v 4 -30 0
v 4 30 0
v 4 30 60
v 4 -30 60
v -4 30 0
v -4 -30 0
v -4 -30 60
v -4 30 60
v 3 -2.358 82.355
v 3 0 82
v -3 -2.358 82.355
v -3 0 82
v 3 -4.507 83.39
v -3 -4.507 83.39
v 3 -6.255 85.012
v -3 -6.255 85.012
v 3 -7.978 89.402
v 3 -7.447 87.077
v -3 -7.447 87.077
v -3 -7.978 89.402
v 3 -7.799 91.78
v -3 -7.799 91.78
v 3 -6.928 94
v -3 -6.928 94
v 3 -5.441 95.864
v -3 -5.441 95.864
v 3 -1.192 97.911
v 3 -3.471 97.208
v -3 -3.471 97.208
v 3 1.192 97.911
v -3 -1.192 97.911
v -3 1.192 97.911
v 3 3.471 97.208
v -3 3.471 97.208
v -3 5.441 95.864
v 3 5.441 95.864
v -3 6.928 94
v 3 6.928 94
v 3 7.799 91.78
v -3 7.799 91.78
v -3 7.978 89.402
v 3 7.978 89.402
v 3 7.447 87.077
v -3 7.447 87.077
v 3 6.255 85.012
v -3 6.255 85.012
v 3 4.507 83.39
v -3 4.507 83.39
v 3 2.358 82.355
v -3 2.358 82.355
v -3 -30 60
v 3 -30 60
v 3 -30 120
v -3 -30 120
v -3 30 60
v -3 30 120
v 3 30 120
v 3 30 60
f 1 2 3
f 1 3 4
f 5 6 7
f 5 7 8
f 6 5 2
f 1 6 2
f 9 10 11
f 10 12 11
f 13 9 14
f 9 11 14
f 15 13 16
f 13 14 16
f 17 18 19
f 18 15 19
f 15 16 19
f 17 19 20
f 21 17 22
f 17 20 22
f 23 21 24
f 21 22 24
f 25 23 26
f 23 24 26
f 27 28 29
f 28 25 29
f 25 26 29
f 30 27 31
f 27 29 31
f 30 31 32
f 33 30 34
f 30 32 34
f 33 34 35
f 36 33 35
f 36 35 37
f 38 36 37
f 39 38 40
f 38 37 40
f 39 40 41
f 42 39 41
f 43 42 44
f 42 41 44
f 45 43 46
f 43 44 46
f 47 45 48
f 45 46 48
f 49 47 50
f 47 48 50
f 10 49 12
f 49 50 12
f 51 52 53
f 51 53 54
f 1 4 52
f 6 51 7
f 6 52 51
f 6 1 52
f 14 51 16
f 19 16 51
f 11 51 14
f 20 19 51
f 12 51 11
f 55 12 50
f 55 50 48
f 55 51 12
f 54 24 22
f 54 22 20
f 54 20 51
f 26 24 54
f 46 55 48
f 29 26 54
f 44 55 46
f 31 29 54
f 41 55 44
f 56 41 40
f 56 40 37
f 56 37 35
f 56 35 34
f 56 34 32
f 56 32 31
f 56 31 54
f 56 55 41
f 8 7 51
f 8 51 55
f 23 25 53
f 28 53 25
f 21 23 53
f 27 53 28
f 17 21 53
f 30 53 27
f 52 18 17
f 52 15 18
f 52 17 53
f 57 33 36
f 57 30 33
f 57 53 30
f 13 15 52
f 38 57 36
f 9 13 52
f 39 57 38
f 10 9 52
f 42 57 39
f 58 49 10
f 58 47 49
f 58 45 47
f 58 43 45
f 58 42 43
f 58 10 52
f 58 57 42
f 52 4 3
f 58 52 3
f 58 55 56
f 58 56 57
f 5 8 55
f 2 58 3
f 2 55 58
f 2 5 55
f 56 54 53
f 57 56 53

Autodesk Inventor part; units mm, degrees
ref_plane "YZ Plane" through (0, 0, 0) normal (1, 0, 0) x (0, 1, 0)
ref_plane "Startebene" through (0, 0, 0) normal (0, 0, 1) x (1, 0, 0)
ref_plane "Endebene" through (0, 0, 120) normal (0, 0, 1) x (1, 0, 0)
sketch "Skizze" plane through (0, 0, 0) normal (0, 0, 1) x (1, 0, 0)
  line L0 (4, -30) -> (-4, -30)
  line L1 (-4, -30) -> (-4, 30)
  line L2 (-4, 30) -> (4, 30)
  line L3 (4, 30) -> (4, -30)
  line L4 (-6, 0) -> (8, 0) construction
  line L5 (0, -30) -> (0, 40) construction
  line L6 (0, 54) -> (0, -44) construction
  line L7 (-9.2, 0) -> (13.2, 0) construction
  dimension "d0" = 60
  dimension "d1" = 8
  dimension "d4" = 4
  dimension "d5" = 30
extrude "Körper" add sketch "Skizze" along normal up to surface (120 mm away) from surface at 0
sketch "Sketch3" plane through (0, 0, 0) normal (0, 0, 1) x (1, 0, 0)
  line L0 (0, 0) -> (10, 0)
ref_plane "Work Plane3" through (0, 0, 0) normal (0, -1, 0) x (1, 0, 0)
sketch "Sketch4" plane through (0, 0, 0) normal (0, -1, 0) x (1, 0, 0)
  line L0 (-2, 0) -> (12, 0)
  line L1 (-2, 120) -> (12, 120)
  dimension "d9" = 120
sketch "Skizze5" plane through (4, -30, 120) normal (1, 0, 0) x (0, 0, -1)
  line L0 (0, 60) -> (0, 0) projected
  line L1 (120, 0) -> (0, 0) projected
  line L2 (0, 60) -> (0, 0) projected
  line L3 (120, 0) -> (0, 0) projected
  line L4 (120, 60) -> (120, 0) projected
  line L5 (120, 60) -> (0, 60) projected
  point P0 (120, 30)
  point P1 (30, 30)
  dimension "d10" = 30
  dimension "d11" = 30
hole "Bohrung1" at (4, 0, 90) direction (-1, 0, 0) diameter 16 end through all
sketch "Skizze6" plane through (4, -30, 120) normal (1, 0, 0) x (0, 0, -1)
  circle A0 centre (30, 30) radius 8 projected
  line L0 (120, 60) -> (0, 60) projected
  line L1 (0, 0) -> (60, 0)
  line L2 (60, 0) -> (60, 60)
  line L3 (60, 60) -> (0, 60)
  line L4 (0, 60) -> (0, 0)
  point P0 (120, 30)
  dimension "d19" = 60
extrude "Extrusion2" cut sketch "Skizze6" against normal blind 1
sketch "Skizze7" plane through (-4, 30, 0) normal (-1, 0, 0) x (0, 0, 1)
  circle A0 centre (90, -30) radius 8 projected
  line L0 (120, -60) -> (60, -60)
  line L1 (60, -60) -> (60, 0.4696)
  line L2 (60, 0.4696) -> (120, 0.4696)
  line L3 (120, 0.4696) -> (120, -60)
  point P0 (0, -30)
  dimension "d22" = 60
extrude "Extrusion3" cut sketch "Skizze7" against normal blind 1
equation "\"d0\" = G_W"
equation "\"d1\" = G_H"
equation "\"d4\" = 0.5 * d1"
equation "\"d5\" = 0.5 * d0"
equation "\"d2\" = G_L"
equation "\"G_W\" = 60"
equation "\"G_H\" = 8"
equation "\"G_L\" = d9"
equation "\"G_OFFSET_START\" = 0"
equation "\"G_OFFSET_END\" = 0"
properties part number "EN 10058 - 60 x 8 - 110" material "Stahl, weich"
